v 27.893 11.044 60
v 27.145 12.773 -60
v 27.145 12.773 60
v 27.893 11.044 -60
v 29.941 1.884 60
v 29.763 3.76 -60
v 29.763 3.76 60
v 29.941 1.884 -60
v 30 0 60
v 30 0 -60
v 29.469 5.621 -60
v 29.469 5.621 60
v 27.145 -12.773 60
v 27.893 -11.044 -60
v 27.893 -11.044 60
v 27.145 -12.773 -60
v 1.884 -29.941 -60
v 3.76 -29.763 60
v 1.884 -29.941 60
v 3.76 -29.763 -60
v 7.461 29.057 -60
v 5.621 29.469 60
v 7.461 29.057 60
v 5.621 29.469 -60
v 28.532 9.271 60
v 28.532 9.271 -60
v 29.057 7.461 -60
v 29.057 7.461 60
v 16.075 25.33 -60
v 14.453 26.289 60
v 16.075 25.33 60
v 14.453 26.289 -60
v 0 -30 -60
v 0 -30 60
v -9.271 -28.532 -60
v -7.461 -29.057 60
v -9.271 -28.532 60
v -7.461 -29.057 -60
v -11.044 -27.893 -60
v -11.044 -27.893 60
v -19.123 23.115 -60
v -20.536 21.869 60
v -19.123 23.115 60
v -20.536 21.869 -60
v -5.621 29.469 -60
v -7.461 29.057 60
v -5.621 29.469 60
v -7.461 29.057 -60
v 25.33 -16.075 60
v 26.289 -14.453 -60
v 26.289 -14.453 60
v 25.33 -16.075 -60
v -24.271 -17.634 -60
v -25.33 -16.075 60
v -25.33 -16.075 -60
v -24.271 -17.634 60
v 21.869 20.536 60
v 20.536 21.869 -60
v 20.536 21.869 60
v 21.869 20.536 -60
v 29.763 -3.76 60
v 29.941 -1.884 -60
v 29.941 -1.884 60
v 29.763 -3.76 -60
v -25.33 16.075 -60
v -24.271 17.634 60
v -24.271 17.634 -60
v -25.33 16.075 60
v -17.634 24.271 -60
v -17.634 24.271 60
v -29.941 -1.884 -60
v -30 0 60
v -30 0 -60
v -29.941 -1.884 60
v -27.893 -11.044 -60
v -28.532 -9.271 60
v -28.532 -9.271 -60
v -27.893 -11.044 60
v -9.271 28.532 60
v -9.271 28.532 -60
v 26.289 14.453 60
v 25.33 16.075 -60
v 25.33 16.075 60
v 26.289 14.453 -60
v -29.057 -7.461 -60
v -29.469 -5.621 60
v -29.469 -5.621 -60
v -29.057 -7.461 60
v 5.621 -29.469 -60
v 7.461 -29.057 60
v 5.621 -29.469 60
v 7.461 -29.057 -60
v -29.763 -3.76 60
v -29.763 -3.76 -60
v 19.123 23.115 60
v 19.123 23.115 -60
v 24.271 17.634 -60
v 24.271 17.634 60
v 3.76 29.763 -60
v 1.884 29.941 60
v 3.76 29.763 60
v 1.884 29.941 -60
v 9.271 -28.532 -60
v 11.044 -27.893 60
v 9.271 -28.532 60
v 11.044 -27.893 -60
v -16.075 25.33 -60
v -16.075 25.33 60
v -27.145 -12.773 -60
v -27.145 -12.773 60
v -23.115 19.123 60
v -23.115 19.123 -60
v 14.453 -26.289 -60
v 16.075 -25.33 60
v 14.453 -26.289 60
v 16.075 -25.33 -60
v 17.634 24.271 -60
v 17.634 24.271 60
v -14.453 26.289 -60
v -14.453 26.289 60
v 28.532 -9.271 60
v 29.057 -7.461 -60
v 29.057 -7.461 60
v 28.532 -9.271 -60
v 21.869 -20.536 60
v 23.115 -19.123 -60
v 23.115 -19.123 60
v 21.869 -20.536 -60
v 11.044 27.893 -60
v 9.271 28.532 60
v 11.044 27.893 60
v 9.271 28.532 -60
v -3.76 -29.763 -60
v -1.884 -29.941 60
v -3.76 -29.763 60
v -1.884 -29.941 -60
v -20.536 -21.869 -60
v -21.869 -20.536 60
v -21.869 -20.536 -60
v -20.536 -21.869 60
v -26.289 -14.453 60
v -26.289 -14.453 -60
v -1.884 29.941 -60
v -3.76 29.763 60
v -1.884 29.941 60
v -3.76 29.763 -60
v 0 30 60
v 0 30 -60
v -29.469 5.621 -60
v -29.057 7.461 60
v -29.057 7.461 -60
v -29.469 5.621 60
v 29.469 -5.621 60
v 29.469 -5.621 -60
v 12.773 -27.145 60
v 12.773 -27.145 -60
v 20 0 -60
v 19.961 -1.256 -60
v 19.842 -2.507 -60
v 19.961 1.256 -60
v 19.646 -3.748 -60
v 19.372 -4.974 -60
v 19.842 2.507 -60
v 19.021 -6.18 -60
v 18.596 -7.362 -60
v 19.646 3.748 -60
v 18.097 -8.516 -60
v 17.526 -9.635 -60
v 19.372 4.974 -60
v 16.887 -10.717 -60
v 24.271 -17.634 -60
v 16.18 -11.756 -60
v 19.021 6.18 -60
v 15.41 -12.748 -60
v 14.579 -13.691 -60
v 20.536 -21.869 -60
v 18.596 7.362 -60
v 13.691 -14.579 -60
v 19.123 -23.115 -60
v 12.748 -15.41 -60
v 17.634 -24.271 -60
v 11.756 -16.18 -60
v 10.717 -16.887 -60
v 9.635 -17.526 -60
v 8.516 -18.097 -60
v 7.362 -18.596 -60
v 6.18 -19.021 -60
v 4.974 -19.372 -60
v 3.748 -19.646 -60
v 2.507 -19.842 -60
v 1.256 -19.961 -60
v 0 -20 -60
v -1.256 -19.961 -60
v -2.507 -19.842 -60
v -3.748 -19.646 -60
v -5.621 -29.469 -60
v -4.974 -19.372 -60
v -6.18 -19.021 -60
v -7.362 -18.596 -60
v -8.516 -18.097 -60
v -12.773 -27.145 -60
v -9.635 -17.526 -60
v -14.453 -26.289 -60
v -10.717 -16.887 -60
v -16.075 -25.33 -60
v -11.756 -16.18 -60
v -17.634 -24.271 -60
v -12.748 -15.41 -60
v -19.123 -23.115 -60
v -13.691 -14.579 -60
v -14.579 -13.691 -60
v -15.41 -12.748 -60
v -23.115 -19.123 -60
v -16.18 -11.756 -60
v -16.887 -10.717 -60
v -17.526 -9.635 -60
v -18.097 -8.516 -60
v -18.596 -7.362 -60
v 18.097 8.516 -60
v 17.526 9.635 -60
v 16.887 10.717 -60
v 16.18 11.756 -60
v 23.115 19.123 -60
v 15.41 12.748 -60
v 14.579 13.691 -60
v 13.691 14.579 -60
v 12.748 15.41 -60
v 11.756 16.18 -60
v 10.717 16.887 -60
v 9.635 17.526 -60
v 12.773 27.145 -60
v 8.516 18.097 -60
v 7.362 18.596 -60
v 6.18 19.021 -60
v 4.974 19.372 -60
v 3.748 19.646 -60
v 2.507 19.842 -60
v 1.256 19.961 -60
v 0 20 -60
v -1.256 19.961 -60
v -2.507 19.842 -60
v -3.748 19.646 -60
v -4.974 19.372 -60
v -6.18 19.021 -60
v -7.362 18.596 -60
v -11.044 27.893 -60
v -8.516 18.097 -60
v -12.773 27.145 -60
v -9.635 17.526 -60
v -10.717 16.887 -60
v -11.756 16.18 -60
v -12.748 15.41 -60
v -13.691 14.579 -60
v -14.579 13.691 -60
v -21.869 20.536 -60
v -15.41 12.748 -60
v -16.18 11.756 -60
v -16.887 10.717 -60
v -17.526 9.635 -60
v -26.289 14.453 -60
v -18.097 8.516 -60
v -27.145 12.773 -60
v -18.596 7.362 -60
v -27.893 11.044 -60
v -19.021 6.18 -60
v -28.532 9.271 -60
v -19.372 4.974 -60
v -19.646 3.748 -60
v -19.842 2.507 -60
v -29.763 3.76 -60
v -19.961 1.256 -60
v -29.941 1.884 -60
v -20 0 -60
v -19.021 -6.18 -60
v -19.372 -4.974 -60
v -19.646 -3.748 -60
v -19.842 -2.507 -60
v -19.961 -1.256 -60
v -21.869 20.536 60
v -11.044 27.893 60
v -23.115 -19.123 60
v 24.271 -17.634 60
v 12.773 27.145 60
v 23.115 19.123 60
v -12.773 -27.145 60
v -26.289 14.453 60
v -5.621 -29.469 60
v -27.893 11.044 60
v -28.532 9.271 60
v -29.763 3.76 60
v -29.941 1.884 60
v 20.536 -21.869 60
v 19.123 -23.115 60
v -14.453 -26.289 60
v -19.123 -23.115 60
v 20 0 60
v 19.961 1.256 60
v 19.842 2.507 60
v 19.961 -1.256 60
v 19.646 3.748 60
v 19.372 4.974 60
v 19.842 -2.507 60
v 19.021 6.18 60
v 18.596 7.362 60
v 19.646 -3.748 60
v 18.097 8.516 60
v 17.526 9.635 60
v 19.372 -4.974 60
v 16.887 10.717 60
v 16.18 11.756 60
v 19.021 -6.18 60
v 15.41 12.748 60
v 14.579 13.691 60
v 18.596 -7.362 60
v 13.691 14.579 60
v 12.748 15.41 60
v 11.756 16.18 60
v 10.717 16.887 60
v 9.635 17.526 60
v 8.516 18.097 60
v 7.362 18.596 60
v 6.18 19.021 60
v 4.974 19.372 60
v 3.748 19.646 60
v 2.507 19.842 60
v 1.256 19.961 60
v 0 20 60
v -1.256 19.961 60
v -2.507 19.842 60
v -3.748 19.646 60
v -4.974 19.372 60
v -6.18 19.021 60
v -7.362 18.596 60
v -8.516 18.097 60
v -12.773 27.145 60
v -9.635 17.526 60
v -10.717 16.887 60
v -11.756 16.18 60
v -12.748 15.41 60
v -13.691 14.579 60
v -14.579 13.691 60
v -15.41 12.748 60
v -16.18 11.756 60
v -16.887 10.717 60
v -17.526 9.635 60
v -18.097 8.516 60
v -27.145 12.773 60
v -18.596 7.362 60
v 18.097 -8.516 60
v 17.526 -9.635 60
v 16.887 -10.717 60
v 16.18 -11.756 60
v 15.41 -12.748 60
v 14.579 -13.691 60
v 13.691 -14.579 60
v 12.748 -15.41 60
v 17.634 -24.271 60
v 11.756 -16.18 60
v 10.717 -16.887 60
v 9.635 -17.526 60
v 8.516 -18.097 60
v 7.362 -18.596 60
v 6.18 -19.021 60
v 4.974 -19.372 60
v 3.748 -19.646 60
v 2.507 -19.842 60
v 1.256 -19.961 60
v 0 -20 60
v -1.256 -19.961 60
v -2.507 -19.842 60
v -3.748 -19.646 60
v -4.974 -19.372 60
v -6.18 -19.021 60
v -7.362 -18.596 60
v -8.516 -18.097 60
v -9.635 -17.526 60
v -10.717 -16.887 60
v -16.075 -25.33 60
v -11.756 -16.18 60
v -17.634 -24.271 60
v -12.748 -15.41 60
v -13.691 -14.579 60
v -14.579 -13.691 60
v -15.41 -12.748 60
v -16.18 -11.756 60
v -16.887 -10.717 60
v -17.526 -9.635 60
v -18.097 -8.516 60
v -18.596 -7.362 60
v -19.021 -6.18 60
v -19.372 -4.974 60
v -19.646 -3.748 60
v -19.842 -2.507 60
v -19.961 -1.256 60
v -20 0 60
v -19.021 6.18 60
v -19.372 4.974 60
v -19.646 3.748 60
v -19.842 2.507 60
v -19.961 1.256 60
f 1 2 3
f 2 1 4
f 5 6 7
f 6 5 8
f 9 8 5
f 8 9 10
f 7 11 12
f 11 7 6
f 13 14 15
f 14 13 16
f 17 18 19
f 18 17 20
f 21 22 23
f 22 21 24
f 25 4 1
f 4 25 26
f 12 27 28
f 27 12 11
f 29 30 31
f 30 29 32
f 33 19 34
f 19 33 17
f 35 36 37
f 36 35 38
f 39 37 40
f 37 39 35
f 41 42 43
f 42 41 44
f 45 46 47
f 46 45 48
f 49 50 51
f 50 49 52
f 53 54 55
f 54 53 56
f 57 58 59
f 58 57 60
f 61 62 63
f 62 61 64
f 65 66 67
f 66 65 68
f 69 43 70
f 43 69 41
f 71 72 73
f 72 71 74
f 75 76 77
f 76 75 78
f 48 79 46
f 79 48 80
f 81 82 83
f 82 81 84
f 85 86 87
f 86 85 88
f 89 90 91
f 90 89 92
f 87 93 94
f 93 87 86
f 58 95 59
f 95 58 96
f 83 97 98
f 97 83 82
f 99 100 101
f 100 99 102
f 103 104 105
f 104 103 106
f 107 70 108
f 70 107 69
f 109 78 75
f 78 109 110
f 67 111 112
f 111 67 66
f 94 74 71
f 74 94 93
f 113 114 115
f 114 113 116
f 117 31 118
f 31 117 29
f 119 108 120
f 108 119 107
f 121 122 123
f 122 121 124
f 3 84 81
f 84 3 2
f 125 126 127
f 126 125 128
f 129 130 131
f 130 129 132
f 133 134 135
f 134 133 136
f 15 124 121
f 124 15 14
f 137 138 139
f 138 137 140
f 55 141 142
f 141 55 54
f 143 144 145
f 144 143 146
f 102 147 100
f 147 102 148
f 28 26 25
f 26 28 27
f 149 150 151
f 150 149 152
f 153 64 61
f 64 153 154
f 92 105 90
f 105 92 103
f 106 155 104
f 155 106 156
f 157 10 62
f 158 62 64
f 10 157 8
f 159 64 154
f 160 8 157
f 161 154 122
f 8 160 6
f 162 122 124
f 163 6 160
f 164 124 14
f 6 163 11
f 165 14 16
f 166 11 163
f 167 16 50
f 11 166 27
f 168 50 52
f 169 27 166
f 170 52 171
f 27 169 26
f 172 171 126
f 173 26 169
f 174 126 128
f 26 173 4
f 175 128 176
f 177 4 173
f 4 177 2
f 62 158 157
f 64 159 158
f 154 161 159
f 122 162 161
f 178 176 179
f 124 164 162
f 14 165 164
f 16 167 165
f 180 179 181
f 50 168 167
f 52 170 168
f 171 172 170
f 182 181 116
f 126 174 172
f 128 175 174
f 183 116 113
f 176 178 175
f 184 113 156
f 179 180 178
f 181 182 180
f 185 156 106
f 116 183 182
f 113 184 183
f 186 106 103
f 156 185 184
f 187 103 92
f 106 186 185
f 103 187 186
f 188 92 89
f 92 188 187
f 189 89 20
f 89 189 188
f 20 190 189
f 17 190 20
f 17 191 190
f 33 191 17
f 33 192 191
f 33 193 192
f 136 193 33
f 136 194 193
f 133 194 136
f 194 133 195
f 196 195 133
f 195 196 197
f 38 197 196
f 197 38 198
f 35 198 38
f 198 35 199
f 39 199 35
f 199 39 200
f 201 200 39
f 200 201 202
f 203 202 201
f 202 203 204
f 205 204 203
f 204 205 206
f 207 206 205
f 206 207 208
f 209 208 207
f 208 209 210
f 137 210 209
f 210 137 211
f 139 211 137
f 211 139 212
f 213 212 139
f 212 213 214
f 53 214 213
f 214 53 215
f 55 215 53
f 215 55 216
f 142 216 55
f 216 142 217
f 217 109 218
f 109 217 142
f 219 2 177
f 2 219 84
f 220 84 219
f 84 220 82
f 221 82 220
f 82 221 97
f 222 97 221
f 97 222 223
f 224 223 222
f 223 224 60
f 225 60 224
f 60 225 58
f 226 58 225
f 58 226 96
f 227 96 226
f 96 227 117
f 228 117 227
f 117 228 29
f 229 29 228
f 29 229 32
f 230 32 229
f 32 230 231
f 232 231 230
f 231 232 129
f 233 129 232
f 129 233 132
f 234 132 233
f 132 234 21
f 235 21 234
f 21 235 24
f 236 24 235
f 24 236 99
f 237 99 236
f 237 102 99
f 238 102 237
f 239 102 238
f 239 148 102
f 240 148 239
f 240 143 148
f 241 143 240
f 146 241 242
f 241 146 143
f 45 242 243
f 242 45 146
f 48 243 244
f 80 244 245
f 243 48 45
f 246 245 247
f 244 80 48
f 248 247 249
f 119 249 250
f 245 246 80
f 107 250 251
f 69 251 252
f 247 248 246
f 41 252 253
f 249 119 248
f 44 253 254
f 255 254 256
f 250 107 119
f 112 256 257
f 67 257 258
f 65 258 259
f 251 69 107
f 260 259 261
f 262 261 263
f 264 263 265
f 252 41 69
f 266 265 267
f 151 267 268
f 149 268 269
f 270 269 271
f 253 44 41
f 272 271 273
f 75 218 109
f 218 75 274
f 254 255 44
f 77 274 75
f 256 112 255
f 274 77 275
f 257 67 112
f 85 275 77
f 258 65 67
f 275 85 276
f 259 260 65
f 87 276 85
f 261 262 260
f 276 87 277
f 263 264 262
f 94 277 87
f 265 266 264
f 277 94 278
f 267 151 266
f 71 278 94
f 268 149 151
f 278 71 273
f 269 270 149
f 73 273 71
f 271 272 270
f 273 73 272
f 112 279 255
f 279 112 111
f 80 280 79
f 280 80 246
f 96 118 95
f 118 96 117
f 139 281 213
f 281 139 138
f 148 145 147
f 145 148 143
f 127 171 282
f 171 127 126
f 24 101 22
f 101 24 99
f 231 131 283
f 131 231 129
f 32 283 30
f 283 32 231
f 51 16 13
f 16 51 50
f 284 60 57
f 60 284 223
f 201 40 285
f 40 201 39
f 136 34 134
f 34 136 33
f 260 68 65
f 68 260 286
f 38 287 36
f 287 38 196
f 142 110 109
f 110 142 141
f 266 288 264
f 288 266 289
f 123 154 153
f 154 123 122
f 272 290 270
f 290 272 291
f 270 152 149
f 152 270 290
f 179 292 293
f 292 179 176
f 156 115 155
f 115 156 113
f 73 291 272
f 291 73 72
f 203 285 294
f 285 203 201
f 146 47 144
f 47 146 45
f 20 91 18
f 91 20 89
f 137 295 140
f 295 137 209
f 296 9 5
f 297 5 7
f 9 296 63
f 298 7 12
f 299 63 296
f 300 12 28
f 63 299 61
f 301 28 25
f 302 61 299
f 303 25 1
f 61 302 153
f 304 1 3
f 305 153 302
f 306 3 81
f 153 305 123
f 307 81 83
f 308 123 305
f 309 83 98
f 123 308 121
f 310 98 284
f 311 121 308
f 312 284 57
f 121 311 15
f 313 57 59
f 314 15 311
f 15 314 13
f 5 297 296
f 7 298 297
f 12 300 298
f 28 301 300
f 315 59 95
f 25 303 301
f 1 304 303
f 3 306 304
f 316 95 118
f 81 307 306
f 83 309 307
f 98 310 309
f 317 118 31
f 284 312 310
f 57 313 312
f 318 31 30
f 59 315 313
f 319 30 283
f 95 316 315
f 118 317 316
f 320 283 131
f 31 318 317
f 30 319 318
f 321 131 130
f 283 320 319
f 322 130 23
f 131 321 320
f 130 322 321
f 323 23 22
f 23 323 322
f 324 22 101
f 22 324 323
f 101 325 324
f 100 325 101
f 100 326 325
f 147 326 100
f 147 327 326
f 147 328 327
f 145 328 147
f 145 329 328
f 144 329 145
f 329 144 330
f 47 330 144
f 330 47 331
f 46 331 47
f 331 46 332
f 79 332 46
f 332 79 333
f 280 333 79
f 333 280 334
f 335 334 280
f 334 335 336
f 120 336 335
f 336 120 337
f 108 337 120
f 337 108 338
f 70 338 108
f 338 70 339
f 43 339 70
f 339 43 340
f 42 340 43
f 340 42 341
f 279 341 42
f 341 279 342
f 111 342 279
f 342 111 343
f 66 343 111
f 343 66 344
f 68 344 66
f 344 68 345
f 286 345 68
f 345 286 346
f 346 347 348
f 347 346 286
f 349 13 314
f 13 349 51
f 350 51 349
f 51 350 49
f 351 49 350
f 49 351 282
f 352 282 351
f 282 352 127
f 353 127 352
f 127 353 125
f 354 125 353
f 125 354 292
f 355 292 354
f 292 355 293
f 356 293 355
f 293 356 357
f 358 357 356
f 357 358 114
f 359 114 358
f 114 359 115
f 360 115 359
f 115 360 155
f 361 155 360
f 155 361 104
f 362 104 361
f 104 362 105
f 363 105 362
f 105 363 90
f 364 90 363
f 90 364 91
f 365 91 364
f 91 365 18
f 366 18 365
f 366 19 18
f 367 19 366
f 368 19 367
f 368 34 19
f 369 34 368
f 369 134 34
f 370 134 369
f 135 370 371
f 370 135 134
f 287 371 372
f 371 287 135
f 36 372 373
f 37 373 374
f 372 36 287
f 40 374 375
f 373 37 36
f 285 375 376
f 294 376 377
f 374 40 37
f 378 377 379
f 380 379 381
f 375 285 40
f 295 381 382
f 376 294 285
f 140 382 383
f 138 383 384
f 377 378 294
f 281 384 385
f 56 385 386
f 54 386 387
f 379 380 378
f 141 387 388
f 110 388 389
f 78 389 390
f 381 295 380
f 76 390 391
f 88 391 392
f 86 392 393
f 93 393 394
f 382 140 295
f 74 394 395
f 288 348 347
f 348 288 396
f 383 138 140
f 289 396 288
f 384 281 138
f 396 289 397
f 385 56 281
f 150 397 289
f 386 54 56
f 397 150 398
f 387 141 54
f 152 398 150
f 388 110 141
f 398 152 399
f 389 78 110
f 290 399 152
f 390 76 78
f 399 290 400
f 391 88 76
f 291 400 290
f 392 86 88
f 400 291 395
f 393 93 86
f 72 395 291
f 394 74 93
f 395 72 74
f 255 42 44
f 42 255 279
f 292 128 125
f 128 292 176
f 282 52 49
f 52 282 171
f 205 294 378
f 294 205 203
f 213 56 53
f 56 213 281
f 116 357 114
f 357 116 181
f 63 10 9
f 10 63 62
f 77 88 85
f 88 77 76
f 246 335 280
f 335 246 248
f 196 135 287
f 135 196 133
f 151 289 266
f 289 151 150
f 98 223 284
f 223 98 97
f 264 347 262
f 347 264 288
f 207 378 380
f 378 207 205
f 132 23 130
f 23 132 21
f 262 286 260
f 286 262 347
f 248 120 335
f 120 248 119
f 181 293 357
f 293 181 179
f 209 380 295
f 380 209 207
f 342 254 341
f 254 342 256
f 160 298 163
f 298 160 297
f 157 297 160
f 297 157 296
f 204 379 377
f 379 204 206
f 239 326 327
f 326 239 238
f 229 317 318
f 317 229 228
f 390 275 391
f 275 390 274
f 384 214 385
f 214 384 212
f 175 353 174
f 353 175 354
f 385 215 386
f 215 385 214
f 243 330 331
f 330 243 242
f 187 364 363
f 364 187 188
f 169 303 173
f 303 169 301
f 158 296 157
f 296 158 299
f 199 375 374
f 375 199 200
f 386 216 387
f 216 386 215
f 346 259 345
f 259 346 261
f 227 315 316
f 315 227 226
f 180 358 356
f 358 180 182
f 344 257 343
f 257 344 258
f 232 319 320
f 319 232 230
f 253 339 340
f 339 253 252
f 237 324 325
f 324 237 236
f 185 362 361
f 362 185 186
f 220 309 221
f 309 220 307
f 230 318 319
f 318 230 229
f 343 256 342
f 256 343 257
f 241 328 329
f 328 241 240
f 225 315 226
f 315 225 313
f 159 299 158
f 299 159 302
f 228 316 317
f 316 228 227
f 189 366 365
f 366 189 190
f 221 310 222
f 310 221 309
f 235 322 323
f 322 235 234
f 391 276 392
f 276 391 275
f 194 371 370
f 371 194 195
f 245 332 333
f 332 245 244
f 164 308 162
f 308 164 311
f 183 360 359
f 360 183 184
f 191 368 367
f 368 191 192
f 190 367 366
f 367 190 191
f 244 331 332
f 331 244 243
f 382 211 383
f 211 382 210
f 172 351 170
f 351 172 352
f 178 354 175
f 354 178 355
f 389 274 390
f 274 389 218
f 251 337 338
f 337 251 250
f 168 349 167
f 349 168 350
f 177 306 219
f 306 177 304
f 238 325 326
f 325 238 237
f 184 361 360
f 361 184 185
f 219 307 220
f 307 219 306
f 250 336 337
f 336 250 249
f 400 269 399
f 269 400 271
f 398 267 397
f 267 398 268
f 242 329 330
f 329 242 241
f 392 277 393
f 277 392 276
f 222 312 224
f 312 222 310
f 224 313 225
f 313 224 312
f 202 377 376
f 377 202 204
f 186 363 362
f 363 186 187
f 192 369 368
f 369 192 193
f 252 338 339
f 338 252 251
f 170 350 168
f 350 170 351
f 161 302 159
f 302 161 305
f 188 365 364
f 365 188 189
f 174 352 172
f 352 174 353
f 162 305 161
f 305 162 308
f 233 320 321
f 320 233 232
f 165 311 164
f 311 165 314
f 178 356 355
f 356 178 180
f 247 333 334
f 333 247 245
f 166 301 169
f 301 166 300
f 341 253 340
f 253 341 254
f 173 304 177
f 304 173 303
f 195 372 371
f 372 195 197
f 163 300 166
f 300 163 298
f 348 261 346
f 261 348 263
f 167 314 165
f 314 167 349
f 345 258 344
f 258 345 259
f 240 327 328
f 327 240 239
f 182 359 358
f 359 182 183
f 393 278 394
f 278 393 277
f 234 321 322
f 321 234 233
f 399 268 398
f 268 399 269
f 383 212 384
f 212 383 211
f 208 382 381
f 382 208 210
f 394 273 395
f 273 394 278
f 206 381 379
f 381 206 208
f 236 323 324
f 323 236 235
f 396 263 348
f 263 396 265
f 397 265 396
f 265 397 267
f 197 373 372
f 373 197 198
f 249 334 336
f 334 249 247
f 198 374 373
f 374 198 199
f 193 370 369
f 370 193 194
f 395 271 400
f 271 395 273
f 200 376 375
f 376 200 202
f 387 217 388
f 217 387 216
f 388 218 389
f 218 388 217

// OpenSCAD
difference(){
    cylinder(h=120, r=30, $fn=100, center=true);
    cylinder(h=120, r=20, $fn=100, center=true);
}
